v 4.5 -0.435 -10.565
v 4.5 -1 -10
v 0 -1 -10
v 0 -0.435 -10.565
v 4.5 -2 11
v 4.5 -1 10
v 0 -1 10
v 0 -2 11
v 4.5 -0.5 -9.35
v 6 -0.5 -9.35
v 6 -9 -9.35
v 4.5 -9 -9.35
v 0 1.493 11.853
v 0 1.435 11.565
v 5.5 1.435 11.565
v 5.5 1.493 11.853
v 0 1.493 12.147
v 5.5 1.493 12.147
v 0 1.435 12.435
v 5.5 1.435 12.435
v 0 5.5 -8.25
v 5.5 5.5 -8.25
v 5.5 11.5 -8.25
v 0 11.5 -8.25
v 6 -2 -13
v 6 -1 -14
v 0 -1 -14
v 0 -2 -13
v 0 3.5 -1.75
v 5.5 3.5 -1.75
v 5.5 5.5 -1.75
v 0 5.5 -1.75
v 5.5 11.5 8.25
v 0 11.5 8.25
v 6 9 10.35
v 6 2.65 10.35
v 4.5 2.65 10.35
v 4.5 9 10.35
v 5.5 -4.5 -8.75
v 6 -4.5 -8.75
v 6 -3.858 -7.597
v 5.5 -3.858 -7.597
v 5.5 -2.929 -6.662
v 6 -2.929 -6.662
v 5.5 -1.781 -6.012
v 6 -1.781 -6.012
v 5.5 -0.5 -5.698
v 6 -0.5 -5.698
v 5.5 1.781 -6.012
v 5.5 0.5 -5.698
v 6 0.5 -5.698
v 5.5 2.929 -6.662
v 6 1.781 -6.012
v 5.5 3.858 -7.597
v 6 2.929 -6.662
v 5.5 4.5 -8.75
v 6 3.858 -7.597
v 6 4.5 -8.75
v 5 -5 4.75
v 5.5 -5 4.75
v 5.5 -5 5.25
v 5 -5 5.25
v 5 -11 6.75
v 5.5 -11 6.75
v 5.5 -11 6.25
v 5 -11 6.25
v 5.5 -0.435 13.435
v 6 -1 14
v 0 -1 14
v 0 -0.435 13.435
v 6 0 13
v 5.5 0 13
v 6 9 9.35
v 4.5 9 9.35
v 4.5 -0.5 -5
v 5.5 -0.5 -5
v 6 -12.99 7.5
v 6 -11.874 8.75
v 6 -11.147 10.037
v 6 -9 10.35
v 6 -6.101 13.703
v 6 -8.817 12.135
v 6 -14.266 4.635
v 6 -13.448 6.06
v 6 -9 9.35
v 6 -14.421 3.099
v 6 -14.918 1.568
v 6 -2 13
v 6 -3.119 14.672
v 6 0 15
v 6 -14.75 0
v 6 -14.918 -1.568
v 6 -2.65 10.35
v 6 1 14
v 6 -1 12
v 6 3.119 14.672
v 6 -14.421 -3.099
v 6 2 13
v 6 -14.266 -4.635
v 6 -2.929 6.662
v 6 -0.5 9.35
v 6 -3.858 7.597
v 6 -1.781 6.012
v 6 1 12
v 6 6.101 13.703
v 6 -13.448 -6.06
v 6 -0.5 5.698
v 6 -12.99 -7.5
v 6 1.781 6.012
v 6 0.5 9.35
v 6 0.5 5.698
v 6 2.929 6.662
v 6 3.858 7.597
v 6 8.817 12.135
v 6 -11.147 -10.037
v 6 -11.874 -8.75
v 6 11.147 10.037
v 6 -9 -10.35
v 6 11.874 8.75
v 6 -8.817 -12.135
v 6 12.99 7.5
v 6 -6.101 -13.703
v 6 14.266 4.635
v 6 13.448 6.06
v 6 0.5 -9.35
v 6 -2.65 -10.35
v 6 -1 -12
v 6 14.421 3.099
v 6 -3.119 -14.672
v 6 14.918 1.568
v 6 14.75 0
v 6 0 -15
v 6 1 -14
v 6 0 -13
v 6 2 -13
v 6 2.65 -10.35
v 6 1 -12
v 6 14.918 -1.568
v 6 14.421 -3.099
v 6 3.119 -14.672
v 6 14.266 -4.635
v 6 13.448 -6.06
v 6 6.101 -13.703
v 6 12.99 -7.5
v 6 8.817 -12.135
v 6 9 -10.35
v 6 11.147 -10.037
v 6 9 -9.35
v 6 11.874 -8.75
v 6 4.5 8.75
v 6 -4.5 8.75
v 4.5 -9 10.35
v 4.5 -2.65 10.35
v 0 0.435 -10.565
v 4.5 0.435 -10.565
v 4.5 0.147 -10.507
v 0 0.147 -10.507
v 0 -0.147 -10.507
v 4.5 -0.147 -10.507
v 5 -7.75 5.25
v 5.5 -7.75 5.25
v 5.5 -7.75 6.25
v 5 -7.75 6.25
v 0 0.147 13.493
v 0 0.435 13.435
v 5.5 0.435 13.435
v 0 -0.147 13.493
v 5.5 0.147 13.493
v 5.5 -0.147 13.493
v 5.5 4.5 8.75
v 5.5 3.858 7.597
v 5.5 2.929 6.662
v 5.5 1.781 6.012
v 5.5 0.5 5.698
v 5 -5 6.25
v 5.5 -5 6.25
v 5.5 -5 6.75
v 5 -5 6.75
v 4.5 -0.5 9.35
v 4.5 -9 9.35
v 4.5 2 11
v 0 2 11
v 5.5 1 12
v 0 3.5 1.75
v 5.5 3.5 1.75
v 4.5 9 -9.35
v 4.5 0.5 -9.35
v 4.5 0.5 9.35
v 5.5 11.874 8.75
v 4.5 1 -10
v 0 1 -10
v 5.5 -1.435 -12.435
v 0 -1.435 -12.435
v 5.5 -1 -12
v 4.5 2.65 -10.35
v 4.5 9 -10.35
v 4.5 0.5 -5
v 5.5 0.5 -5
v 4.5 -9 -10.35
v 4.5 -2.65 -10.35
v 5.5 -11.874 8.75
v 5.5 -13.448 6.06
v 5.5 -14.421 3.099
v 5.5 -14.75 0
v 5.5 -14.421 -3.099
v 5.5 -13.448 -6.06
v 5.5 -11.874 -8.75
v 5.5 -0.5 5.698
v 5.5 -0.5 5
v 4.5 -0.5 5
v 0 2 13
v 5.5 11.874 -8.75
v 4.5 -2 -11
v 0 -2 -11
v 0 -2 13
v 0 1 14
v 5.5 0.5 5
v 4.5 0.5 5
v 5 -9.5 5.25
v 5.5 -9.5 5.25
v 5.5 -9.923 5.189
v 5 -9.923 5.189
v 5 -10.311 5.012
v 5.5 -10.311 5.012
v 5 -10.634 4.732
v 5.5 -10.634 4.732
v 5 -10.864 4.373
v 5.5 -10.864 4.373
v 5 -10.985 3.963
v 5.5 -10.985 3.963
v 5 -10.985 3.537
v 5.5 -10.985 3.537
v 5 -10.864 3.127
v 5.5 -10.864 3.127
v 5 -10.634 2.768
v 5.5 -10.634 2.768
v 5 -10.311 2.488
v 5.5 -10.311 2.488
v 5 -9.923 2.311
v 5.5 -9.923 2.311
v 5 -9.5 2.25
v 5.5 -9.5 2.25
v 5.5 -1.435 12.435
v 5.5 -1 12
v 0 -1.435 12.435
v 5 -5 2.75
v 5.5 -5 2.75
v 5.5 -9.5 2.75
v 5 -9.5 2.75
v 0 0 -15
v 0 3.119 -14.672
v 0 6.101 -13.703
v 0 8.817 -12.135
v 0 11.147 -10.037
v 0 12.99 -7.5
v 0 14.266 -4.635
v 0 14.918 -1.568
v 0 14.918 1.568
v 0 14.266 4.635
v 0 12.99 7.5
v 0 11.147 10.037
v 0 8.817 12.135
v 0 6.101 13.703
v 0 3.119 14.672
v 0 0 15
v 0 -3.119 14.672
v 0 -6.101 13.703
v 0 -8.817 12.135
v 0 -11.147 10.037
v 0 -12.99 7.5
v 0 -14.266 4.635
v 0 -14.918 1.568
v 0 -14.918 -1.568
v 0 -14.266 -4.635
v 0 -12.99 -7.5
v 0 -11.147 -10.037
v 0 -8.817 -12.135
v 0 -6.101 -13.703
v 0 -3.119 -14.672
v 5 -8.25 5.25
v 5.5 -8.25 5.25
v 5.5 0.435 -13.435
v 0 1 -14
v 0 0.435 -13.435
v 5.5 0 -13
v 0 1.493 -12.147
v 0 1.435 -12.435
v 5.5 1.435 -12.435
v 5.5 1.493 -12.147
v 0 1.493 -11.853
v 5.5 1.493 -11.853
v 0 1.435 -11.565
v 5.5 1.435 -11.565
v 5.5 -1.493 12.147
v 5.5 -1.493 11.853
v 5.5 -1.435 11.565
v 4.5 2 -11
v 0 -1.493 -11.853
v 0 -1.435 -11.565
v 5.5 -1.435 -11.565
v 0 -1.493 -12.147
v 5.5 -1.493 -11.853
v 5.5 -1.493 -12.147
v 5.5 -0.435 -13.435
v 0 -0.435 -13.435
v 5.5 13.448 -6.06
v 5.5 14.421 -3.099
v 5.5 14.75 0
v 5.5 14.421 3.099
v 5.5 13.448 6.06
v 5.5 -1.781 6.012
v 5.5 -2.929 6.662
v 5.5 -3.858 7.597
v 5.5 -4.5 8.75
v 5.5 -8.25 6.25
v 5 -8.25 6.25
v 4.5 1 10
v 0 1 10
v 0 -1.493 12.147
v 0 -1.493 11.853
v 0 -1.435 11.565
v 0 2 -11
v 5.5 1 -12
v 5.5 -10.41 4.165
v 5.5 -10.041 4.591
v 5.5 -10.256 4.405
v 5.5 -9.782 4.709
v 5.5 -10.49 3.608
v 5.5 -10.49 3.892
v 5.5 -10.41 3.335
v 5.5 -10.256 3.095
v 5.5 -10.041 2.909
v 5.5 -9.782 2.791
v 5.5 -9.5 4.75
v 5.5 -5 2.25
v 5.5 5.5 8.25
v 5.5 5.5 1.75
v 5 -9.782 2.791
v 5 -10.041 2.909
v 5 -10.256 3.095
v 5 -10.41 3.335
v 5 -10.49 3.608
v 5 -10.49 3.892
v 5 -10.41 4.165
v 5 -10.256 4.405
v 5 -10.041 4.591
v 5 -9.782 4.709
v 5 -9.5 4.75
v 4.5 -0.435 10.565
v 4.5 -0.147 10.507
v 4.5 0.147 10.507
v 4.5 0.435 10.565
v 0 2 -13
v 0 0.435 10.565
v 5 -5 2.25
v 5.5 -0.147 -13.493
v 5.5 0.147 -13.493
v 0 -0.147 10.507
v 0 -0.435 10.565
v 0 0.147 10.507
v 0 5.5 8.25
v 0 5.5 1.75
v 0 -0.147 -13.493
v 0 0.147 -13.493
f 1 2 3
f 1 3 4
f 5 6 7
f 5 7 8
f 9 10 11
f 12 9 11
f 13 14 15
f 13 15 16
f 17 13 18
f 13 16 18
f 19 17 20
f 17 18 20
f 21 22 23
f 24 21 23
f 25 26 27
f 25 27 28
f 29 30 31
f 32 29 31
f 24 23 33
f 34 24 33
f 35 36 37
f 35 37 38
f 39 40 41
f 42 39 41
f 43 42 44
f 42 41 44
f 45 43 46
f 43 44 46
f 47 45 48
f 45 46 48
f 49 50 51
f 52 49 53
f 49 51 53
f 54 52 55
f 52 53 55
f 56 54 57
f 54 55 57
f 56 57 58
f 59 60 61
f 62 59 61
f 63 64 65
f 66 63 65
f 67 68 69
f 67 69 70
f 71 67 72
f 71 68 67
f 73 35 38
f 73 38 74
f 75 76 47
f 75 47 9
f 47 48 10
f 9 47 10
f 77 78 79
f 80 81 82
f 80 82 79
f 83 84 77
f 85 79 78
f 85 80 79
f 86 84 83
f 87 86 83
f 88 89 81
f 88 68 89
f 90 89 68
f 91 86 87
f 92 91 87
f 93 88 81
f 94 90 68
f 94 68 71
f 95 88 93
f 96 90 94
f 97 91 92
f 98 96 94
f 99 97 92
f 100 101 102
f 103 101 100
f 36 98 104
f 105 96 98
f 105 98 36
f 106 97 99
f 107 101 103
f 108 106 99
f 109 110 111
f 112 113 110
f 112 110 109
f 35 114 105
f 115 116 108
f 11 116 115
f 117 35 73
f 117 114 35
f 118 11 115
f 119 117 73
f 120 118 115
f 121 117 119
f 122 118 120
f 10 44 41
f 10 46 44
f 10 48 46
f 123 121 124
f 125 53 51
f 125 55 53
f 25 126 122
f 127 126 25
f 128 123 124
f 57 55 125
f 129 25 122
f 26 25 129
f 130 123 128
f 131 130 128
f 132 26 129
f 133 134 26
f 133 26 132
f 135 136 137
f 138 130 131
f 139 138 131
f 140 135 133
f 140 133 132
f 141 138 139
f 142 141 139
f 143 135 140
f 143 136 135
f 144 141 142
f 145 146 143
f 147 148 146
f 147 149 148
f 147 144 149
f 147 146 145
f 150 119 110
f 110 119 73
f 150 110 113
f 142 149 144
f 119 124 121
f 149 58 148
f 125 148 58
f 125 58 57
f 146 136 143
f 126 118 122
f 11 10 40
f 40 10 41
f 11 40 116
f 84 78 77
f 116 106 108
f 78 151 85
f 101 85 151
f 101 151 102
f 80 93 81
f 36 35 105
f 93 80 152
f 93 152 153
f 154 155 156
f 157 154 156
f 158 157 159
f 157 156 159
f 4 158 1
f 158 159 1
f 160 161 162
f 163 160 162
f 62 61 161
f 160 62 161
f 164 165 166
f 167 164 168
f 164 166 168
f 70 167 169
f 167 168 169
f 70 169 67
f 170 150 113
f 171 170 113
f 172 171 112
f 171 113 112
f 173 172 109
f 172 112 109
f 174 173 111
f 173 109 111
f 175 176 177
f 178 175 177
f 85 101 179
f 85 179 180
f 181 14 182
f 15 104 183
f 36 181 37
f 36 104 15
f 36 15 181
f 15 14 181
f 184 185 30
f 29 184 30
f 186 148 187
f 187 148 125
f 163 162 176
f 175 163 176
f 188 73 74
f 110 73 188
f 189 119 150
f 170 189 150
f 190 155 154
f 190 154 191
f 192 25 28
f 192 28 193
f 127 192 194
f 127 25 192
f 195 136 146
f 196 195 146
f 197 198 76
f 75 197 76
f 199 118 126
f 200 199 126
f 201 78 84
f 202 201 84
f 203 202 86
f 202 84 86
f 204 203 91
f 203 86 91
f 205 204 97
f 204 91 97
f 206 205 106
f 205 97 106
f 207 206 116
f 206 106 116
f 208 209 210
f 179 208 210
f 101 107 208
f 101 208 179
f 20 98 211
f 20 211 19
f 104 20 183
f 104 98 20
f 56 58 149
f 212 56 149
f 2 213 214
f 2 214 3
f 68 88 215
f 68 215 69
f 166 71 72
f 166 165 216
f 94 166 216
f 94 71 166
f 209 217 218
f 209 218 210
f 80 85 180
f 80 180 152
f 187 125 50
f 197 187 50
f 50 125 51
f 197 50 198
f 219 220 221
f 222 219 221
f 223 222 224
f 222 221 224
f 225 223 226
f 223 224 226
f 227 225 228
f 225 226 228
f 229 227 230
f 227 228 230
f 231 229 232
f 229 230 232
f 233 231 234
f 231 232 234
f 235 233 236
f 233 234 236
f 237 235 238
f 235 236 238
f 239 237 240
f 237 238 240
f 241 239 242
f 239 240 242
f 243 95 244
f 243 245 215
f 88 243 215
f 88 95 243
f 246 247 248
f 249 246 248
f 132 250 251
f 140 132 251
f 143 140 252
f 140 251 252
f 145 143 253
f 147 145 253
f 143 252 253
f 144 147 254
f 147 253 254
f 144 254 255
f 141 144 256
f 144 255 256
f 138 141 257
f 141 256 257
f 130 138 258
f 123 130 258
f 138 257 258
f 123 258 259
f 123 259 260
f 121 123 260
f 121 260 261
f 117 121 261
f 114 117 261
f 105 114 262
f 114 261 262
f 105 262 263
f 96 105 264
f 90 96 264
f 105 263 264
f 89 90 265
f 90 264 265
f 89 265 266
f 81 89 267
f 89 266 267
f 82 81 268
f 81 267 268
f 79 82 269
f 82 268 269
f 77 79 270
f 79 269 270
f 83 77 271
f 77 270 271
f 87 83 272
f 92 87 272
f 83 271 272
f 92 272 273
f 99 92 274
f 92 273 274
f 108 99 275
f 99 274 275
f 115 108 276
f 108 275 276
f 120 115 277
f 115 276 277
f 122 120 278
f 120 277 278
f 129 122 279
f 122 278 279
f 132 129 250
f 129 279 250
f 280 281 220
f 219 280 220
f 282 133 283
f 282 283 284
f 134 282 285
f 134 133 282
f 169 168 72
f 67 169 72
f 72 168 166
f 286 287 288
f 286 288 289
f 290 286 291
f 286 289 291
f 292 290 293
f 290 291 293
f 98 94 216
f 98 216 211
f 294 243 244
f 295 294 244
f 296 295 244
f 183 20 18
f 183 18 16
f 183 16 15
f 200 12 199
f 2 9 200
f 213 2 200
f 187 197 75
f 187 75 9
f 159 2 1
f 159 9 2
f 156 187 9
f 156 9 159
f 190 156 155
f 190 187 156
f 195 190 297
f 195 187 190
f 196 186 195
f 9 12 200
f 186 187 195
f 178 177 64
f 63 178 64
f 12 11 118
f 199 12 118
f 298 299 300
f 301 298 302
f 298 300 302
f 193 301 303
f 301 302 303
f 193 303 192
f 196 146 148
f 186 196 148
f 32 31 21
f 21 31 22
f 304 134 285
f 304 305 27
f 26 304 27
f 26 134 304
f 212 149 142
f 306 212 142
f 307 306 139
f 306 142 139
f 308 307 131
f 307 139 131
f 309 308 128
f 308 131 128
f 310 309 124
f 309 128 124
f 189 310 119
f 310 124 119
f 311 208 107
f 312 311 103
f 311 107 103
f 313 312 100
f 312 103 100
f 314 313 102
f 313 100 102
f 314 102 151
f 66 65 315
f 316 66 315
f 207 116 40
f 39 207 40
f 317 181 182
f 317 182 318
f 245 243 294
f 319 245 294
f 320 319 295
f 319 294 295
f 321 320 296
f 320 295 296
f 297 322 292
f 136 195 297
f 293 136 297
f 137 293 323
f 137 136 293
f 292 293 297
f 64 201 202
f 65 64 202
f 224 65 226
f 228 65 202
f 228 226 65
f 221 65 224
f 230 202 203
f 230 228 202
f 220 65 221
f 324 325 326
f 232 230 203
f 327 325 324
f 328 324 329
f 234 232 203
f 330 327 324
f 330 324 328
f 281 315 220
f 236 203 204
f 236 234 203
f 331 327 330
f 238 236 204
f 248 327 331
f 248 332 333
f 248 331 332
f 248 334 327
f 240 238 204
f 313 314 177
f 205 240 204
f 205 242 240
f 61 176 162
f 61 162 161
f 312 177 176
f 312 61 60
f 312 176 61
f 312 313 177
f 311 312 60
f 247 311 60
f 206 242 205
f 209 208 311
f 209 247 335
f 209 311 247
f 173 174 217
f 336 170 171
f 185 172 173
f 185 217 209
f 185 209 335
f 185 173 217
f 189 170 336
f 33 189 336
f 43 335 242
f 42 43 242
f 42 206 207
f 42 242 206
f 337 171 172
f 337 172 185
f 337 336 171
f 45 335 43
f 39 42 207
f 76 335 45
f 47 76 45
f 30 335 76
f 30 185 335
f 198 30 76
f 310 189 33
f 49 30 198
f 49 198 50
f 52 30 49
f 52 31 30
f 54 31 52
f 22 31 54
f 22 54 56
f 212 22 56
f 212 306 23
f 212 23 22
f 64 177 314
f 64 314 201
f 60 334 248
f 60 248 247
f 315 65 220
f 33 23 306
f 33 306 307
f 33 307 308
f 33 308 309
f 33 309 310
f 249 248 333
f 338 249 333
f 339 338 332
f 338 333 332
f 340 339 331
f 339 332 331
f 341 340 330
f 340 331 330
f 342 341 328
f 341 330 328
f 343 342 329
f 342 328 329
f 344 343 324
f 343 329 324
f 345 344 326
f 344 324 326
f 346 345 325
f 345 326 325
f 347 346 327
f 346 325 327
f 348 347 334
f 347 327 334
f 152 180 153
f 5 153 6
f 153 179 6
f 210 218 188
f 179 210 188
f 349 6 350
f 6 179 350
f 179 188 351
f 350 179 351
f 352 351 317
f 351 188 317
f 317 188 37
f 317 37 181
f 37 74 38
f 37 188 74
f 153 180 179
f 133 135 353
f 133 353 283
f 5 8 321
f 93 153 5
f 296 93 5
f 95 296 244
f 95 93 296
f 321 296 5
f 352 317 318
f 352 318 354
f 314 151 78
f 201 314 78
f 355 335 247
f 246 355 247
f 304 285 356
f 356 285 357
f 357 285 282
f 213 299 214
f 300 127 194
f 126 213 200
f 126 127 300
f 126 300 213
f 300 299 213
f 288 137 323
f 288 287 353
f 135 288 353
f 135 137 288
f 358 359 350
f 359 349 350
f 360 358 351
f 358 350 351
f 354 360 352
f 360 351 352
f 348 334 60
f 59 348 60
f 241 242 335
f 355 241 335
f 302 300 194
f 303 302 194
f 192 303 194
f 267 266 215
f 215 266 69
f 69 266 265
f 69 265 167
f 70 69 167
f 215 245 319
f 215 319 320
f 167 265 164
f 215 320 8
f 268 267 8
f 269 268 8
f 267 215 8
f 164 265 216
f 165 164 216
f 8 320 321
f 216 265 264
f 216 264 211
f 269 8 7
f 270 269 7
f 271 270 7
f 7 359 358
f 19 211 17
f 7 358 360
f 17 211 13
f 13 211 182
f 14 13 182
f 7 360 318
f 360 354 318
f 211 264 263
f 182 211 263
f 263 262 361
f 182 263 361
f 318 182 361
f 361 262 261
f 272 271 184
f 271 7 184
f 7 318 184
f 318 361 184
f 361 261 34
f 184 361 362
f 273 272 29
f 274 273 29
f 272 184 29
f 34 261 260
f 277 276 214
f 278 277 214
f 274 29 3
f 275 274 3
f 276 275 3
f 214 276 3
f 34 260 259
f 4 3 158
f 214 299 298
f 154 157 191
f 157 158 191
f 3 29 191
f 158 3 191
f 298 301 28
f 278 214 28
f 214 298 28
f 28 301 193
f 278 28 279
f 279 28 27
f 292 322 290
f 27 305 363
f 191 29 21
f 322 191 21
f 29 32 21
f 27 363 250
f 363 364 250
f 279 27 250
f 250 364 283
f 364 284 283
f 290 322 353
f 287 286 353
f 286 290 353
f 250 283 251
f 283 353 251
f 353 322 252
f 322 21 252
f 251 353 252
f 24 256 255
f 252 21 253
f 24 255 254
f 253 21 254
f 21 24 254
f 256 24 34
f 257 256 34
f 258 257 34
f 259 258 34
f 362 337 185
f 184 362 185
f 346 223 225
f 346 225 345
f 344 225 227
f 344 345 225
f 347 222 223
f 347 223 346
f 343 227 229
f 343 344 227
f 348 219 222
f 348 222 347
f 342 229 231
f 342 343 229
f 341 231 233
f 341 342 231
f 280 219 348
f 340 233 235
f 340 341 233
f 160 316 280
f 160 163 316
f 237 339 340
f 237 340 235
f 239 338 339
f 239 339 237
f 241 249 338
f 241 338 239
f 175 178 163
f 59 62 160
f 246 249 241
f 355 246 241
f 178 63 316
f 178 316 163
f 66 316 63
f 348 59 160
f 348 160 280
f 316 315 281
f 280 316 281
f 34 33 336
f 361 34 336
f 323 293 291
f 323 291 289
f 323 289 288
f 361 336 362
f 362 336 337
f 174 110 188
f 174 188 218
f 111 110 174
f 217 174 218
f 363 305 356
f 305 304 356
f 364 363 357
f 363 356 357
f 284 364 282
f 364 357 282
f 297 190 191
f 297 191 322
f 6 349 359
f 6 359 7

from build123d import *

# Parameters (mm, degrees)
SKETCH1_R           = 15
BOSS_EXTRUDE1_DEPTH = 6
CUT_EXTRUDE1_DEPTH  = 0.5
CUT_EXTRUDE2_DEPTH  = 22.914607001
CUT_EXTRUDE4_DEPTH  = 1.5
CUT_EXTRUDE5_DEPTH  = 22.685248442
CUT_EXTRUDE7_DEPTH  = 0.5
SKETCH7_R           = 1.5
CUT_EXTRUDE6_DEPTH  = 10


with BuildPart() as part:
    # Sketch1 → Boss-Extrude1 (new body)
    with BuildSketch(Plane(origin=(0, 0, 0), x_dir=(0, 0, -1), z_dir=(1, 0, 0))):
        Circle(SKETCH1_R)
    extrude(amount=BOSS_EXTRUDE1_DEPTH)

    # Sketch2 → Cut-Extrude1 (cut)
    with BuildSketch(Plane(origin=(6, 0, 0), x_dir=(0, 0, -1), z_dir=(1, 0, 0))):
        with BuildLine():
            Line((-8.75, 11.874342087), (-8.75, 4.5))
            ThreePointArc((-8.75, 4.5), (-5.671698021, 0), (-8.75, -4.5))
            Line((-8.75, -4.5), (-8.75, -11.874342087))
            ThreePointArc((-8.75, -11.874342087), (0, -14.75), (8.75, -11.874342087))
            Line((8.75, -11.874342087), (8.75, -4.5))
            ThreePointArc((8.75, -4.5), (5.671698021, 0), (8.75, 4.5))
            Line((8.75, 4.5), (8.75, 11.874342087))
            ThreePointArc((8.75, 11.874342087), (0, 14.75), (-8.75, 11.874342087))
        make_face()
    extrude(amount=-CUT_EXTRUDE1_DEPTH, mode=Mode.SUBTRACT)

    # Sketch3 → Cut-Extrude2 (cut, through all)
    with BuildSketch(Plane(origin=(5.5, 0, 0), x_dir=(0, 0, -1), z_dir=(1, 0, 0))):
        Polygon((-8.25, 11.5), (-8.25, 5.5), (-1.75, 5.5), (-1.75, 3.5), (1.75, 3.5), (1.75, 5.5), (8.25, 5.5), (8.25, 11.5), align=None)
    extrude(amount=-CUT_EXTRUDE2_DEPTH, mode=Mode.SUBTRACT)

    # Sketch4 → Cut-Extrude4 (cut)
    with BuildSketch(Plane(origin=(6, 0, 0), x_dir=(0, 0, -1), z_dir=(1, 0, 0))):
        Polygon((-9.35, 9), (-9.35, 0.5), (-5, 0.5), (-5, -0.5), (-9.35, -0.5), (-9.35, -9), (-10.35, -9), (-10.35, -2.65), (-12, -1), (-13, -2), (-14, -1), (-13, 0), (-14, 1), (-13, 2), (-12, 1), (-10.35, 2.65), (-10.35, 9), align=None)
        Polygon((9.35, -0.5), (9.35, -9), (10.35, -9), (10.35, -2.65), (12, -1), (13, -2), (14, -1), (13, 0), (14, 1), (13, 2), (12, 1), (10.35, 2.65), (10.35, 9), (9.35, 9), (9.35, 0.5), (5, 0.5), (5, -0.5), align=None)
    extrude(amount=-CUT_EXTRUDE4_DEPTH, mode=Mode.SUBTRACT)

    # Sketch5 → Cut-Extrude5 (cut, through all)
    with BuildSketch(Plane(origin=(4.5, 0, 0), x_dir=(0, 0, -1), z_dir=(1, 0, 0))):
        Polygon((-12, -1), (-13, -2), (-14, -1), (-13, 0), (-14, 1), (-13, 2), (-12, 1), (-11, 2), (-10, 1), (-11, 0), (-10, -1), (-11, -2), align=None)
        Polygon((12, -1), (11, -2), (10, -1), (11, 0), (10, 1), (11, 2), (12, 1), (13, 2), (14, 1), (13, 0), (14, -1), (13, -2), align=None)
    extrude(amount=-CUT_EXTRUDE5_DEPTH, mode=Mode.SUBTRACT)

    # Sketch6 → Cut-Extrude7 (cut)
    with BuildSketch(Plane(origin=(5.5, 0, 0), x_dir=(0, 0, -1), z_dir=(1, 0, 0))):
        with BuildLine():
            Line((-6.75, -5), (-6.75, -11))
            Line((-6.75, -11), (-6.25, -11))
            Line((-6.25, -11), (-6.25, -8.25))
            Line((-6.25, -8.25), (-5.25, -8.25))
            Line((-5.25, -8.25), (-5.25, -9.5))
            ThreePointArc((-5.25, -9.5), (-3.75, -11), (-2.25, -9.5))
            Line((-2.25, -9.5), (-2.25, -5))
            Line((-2.25, -5), (-2.75, -5))
            Line((-2.75, -5), (-2.75, -9.5))
            ThreePointArc((-2.75, -9.5), (-3.75, -10.5), (-4.75, -9.5))
            Line((-4.75, -9.5), (-4.75, -5))
            Line((-4.75, -5), (-5.25, -5))
            Line((-5.25, -5), (-5.25, -7.75))
            Line((-5.25, -7.75), (-6.25, -7.75))
            Line((-6.25, -7.75), (-6.25, -5))
            Line((-6.25, -5), (-6.75, -5))
        make_face()
    extrude(amount=-CUT_EXTRUDE7_DEPTH, mode=Mode.SUBTRACT)

    # Sketch7 → Cut-Extrude6 (cut)
    with BuildSketch(Plane(origin=(5.5, 0, 0), x_dir=(0, 0, -1), z_dir=(1, 0, 0))):
        with Locations((-12, 0)):
            Circle(SKETCH7_R)
        with Locations((12, 0)):
            Circle(SKETCH7_R)
    extrude(amount=-CUT_EXTRUDE6_DEPTH, mode=Mode.SUBTRACT)


solid = part.part
